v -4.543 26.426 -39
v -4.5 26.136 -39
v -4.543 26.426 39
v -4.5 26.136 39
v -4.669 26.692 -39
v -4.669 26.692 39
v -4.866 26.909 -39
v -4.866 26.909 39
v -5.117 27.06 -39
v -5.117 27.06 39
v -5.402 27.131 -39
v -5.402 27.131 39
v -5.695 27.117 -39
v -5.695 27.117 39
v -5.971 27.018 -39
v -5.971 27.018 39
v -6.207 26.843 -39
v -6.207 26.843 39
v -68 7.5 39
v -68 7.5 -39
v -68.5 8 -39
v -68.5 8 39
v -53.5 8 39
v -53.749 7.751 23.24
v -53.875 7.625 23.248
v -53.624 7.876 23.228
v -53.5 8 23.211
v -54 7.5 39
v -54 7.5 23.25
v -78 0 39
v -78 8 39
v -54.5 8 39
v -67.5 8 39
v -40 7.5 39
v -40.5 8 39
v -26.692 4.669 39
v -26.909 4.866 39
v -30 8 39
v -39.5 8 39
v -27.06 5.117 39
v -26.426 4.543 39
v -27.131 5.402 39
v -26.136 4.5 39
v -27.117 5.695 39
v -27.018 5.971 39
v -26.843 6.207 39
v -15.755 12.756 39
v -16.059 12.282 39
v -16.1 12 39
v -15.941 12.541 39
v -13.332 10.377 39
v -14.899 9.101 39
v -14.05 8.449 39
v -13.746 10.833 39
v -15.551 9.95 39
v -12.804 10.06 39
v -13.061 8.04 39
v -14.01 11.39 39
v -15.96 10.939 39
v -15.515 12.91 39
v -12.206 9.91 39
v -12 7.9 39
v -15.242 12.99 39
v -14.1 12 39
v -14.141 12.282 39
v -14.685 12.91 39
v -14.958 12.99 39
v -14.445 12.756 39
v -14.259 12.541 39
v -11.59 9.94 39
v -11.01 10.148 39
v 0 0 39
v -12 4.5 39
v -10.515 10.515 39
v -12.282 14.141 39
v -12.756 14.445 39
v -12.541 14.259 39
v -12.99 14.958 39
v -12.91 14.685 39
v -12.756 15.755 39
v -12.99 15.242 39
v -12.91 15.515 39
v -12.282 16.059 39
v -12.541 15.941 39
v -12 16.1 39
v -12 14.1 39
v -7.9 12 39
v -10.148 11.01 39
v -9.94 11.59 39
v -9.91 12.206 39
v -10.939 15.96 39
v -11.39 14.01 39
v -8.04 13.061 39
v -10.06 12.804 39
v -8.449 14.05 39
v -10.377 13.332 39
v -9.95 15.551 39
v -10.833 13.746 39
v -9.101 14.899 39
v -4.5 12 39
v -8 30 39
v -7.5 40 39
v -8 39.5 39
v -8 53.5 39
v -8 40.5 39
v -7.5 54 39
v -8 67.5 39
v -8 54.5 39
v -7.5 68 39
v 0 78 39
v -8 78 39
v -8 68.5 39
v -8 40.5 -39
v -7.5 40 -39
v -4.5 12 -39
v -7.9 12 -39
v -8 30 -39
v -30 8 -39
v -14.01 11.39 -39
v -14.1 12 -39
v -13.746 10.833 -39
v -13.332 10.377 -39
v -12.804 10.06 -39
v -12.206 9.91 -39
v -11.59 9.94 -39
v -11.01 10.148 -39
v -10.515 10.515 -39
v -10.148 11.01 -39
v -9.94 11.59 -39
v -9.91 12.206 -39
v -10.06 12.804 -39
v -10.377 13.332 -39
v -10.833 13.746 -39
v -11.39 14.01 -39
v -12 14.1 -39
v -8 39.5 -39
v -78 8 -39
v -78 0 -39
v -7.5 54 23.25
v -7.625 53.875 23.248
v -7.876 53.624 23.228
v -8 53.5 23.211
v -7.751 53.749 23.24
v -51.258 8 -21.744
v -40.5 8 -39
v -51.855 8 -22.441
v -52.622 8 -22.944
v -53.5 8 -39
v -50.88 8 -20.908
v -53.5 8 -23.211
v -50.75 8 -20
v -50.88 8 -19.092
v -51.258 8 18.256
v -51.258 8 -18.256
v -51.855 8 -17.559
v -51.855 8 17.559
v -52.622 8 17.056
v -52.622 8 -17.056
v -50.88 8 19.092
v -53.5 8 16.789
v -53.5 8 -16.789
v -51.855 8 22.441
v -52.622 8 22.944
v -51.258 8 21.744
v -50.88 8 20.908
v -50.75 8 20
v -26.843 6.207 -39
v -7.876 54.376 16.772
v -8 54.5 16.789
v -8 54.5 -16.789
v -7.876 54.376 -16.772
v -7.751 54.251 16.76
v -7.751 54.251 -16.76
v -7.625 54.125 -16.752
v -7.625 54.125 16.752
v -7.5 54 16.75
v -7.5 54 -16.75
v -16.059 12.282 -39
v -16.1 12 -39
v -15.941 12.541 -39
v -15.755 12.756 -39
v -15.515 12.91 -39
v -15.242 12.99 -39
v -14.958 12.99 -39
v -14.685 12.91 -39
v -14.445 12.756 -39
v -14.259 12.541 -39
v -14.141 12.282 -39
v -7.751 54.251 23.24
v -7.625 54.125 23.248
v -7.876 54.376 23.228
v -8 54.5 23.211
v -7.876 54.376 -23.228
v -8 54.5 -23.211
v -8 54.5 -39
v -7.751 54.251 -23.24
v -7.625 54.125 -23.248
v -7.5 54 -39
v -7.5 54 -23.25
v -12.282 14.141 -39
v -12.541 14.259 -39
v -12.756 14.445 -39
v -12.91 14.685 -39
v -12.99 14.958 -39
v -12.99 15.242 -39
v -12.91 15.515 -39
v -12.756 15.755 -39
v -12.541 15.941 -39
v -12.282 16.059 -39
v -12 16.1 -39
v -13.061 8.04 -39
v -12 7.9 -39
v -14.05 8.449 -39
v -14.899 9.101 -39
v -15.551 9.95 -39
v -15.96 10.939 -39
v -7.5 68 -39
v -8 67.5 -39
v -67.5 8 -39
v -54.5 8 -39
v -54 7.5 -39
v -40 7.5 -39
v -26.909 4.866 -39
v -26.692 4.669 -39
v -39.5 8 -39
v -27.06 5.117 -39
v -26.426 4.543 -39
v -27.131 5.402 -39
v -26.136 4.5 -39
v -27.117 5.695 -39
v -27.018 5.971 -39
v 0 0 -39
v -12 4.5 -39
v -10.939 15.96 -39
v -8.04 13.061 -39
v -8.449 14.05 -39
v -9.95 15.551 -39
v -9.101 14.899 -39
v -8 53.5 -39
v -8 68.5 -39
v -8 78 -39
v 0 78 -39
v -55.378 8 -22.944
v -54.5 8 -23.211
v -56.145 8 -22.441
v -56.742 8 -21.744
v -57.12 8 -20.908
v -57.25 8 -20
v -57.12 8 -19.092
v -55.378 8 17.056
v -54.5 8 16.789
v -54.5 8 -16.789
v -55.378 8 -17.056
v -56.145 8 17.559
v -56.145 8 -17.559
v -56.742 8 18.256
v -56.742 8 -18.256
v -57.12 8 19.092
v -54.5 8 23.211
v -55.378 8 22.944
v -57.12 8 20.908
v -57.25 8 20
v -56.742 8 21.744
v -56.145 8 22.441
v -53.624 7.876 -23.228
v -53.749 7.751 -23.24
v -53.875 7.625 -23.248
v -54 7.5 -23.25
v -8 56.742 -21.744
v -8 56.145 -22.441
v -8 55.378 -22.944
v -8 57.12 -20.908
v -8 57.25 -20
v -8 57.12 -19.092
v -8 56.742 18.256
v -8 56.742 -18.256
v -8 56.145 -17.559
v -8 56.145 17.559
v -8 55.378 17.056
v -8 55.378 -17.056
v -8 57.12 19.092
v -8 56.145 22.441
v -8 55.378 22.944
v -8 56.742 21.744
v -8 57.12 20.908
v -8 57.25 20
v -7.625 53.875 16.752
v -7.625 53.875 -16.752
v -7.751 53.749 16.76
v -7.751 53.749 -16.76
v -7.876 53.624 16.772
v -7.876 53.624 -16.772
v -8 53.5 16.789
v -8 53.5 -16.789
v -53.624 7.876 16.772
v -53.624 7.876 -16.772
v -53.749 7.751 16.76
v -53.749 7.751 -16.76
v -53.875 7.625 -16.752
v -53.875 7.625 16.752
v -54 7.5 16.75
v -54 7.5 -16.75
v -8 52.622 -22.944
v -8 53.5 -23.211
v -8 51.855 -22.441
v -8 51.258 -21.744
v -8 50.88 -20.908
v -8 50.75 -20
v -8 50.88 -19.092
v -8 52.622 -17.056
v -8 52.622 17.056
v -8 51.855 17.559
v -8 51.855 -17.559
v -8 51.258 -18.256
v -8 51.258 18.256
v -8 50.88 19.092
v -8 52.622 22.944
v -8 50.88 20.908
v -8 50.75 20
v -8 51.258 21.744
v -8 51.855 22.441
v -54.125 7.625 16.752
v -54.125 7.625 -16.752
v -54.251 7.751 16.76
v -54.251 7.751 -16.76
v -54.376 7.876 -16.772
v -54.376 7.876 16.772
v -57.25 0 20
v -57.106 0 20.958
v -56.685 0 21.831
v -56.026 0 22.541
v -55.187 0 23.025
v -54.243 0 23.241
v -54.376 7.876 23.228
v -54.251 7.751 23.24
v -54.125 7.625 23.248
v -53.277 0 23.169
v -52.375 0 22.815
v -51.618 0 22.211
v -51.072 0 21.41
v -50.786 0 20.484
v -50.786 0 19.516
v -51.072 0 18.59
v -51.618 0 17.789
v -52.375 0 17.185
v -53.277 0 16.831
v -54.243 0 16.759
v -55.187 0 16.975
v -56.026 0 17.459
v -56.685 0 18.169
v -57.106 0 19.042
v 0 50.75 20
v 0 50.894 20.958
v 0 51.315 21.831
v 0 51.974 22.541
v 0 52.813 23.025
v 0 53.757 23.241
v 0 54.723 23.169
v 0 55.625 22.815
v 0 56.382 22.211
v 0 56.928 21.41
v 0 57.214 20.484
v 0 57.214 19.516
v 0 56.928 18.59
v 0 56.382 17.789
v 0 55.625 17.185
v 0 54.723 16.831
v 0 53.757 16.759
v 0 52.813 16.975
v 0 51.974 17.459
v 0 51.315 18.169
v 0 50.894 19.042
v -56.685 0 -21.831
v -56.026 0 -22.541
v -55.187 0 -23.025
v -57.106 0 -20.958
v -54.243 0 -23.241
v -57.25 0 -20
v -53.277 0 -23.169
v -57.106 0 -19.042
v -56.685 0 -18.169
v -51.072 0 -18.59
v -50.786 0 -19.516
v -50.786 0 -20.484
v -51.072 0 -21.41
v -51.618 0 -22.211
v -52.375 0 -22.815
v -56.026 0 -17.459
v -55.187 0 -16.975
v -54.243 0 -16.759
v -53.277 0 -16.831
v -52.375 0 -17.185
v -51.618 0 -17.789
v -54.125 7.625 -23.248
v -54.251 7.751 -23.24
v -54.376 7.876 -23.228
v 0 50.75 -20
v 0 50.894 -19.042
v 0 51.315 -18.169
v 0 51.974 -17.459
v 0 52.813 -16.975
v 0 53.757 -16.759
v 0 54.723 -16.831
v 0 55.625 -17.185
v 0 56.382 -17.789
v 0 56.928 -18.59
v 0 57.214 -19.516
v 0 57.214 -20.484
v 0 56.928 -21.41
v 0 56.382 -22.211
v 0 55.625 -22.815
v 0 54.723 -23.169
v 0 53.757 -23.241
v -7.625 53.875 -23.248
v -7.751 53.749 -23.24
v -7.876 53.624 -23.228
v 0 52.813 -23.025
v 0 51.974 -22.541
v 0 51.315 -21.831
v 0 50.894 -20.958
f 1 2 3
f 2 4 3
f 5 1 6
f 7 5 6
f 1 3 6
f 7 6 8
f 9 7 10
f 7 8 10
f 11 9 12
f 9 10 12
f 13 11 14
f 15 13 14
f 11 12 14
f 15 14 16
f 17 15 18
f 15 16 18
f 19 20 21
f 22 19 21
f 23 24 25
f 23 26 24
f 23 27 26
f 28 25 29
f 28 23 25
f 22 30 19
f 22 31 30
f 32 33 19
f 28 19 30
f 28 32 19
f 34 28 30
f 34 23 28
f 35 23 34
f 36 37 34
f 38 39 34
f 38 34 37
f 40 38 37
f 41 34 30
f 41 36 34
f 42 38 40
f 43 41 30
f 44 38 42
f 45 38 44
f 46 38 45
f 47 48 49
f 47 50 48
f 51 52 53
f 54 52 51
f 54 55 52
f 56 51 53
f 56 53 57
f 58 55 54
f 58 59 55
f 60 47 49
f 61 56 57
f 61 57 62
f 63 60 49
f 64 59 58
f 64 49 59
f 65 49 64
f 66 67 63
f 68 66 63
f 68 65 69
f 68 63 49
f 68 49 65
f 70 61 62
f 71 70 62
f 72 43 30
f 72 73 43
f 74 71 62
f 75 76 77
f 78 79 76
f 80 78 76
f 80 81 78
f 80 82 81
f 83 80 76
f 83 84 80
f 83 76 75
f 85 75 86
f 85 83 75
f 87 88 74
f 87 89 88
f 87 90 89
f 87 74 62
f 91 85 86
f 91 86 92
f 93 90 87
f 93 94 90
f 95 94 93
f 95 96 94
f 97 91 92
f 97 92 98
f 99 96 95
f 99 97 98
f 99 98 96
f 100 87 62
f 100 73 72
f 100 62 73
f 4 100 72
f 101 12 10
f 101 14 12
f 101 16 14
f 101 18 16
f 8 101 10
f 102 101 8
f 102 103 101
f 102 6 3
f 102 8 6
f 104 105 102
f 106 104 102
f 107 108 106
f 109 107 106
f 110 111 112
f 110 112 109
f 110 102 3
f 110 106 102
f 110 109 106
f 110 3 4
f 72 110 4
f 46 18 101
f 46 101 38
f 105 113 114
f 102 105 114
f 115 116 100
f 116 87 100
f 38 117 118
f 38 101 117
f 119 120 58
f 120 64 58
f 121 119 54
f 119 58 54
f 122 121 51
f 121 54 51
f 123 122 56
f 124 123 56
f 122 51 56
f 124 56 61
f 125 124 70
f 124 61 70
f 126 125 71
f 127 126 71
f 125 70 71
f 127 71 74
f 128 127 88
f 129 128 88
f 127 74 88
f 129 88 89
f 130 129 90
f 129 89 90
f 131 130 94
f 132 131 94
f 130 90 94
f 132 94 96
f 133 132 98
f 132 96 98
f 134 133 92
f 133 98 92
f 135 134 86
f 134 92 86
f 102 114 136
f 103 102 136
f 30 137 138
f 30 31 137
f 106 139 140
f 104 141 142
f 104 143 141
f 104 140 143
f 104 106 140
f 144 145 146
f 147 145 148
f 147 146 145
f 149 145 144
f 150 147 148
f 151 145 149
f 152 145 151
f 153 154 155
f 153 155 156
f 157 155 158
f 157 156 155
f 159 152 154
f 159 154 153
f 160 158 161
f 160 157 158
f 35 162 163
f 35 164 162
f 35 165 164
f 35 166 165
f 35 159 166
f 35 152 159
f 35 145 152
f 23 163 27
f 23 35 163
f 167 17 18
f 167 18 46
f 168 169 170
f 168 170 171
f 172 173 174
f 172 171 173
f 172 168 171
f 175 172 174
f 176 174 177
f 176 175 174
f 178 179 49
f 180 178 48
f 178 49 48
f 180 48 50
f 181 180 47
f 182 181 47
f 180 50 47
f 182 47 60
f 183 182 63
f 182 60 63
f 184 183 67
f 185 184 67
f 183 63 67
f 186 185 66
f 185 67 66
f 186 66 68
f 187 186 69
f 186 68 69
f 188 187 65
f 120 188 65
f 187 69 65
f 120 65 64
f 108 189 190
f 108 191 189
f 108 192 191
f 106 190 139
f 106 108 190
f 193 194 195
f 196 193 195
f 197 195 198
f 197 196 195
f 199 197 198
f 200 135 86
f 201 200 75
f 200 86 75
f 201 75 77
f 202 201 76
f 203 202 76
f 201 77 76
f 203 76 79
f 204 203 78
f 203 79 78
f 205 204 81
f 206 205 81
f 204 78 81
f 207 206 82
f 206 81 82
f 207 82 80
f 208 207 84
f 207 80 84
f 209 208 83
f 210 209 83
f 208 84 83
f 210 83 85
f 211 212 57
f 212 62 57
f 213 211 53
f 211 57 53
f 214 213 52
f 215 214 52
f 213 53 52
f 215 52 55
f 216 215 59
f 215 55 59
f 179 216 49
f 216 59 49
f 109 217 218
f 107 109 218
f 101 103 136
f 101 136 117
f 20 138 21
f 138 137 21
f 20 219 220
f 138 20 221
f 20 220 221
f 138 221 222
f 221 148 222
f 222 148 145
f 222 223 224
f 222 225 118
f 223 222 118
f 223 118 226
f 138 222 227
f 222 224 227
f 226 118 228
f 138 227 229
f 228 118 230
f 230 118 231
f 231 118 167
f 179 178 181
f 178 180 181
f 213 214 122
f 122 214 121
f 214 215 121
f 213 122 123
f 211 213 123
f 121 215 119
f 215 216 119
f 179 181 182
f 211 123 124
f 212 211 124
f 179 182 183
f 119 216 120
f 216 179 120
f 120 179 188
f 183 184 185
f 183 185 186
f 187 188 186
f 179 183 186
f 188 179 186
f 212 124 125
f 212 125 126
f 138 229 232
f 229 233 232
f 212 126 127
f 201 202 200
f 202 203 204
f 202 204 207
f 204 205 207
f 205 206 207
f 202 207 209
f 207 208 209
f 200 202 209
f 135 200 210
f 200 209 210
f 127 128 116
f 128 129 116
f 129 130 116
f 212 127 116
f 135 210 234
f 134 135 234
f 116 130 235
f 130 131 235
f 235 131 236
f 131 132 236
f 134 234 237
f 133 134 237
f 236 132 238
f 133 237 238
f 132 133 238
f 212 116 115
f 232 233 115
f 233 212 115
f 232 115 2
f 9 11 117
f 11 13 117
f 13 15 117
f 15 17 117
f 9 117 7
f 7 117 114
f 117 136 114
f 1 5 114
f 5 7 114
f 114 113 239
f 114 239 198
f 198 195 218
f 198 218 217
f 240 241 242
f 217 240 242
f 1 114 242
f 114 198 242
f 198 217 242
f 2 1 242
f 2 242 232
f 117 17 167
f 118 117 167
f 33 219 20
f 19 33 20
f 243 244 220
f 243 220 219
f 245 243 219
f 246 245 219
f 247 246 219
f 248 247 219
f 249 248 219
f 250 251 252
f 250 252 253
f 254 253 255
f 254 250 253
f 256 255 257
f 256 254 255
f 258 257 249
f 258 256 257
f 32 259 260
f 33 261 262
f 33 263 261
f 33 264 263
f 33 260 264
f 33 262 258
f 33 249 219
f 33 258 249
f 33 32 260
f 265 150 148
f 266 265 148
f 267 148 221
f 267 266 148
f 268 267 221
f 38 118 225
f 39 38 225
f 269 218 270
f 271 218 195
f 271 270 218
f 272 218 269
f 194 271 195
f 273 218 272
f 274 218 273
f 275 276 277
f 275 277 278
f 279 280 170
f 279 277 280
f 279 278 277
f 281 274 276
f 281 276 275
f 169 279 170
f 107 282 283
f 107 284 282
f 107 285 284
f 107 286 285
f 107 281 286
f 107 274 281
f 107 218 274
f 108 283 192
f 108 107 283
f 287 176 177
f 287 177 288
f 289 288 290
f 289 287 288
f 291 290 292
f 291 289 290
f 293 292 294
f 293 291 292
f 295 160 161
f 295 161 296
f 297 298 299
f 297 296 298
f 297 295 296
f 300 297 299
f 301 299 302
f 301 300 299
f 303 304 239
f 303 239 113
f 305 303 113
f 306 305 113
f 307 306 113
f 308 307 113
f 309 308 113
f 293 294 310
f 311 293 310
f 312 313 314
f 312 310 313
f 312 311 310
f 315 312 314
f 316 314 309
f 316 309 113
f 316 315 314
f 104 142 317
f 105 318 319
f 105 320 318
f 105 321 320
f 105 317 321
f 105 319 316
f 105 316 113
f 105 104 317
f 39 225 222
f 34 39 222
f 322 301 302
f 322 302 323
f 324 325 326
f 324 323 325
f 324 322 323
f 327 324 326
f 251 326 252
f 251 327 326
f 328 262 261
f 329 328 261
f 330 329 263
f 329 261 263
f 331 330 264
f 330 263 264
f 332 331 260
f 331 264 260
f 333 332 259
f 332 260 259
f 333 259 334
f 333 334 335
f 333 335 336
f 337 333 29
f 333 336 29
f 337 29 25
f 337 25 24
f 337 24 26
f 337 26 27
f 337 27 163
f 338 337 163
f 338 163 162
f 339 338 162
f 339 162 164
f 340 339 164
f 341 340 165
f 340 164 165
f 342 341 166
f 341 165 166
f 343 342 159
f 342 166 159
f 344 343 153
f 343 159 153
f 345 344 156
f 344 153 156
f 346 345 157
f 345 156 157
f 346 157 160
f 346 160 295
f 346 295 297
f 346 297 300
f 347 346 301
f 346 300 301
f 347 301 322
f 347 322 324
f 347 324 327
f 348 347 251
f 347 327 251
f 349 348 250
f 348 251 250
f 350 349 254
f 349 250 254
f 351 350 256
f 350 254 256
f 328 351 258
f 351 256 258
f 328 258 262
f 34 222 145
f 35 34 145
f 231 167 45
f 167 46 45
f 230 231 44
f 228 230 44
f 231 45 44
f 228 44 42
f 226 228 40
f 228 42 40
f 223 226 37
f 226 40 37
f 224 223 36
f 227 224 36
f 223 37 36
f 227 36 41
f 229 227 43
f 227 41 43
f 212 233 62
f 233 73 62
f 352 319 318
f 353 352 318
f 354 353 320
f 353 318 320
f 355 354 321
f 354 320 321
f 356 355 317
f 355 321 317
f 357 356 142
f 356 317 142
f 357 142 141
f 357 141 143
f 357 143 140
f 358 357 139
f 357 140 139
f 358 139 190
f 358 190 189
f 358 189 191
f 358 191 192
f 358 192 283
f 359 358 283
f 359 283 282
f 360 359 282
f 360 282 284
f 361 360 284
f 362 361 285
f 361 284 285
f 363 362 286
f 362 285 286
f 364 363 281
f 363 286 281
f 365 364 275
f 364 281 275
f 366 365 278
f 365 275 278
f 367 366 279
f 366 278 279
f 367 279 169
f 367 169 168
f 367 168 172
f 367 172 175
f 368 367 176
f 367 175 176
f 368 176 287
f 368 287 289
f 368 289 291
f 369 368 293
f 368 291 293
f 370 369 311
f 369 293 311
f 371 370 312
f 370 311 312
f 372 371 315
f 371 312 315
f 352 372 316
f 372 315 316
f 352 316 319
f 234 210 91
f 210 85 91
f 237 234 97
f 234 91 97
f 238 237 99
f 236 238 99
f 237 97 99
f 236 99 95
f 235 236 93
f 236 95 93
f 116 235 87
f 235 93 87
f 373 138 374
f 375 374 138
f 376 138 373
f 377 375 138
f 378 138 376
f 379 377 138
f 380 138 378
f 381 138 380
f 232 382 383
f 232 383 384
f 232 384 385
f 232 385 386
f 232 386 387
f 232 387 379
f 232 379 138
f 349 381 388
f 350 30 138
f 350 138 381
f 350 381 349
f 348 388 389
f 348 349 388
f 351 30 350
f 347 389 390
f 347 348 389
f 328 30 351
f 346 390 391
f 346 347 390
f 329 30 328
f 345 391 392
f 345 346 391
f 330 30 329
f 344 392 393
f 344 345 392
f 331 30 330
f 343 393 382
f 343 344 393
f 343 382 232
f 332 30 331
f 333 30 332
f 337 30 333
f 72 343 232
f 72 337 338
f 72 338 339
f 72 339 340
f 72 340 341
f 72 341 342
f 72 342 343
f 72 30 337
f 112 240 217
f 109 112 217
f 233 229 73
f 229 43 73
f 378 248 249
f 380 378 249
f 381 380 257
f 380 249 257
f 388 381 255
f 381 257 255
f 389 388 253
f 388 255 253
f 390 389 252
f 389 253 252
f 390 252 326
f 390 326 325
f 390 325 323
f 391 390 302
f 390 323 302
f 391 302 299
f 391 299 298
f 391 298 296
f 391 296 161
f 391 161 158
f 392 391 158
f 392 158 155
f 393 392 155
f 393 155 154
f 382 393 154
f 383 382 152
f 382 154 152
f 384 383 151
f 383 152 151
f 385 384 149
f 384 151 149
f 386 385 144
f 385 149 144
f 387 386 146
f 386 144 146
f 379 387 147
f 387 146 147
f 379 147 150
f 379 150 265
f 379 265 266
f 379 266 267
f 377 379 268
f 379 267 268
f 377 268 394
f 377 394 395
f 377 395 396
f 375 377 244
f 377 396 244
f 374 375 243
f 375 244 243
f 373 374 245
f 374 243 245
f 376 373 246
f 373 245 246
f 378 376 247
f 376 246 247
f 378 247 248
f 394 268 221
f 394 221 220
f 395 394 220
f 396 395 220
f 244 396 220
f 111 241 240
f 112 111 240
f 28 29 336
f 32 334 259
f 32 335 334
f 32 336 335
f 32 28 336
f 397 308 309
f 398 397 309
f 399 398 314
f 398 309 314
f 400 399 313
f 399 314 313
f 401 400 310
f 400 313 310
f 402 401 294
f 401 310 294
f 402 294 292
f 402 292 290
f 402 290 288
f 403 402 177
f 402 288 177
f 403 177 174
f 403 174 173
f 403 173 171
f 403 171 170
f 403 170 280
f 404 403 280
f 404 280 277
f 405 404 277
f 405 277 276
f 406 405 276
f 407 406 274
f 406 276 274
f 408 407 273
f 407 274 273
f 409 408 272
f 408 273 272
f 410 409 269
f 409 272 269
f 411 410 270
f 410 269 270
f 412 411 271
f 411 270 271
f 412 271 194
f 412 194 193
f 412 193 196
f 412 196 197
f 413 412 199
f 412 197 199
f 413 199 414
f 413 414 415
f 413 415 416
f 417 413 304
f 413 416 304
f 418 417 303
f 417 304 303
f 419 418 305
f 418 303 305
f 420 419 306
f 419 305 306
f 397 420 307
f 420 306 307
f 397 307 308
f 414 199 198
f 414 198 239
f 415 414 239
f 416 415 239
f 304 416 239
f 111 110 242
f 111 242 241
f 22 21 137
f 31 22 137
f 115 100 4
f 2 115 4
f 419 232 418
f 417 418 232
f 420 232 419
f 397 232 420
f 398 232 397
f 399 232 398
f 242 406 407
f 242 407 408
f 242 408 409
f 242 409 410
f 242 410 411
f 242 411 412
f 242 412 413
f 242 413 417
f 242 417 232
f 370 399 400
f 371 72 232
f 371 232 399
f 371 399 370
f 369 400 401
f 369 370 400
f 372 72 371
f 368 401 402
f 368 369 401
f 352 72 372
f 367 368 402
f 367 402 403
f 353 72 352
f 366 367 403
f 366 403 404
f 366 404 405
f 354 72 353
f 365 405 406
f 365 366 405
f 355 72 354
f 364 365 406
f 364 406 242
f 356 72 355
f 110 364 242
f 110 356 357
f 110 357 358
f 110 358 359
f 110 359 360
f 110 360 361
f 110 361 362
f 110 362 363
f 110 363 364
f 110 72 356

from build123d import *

# Parameters (mm, degrees)
EXTRUDE_1_DEPTH     = 39
SKETCH_2_R          = 3.25
CUT_EXTRUDE_1_DEPTH = 9
SKETCH_3_R          = 3.25
CUT_EXTRUDE_2_DEPTH = 9


with BuildPart() as part:
    # Эскиз1 → Бобышка-Вытянуть1 (new body, symmetric)
    with BuildSketch(Plane.XY):
        Polygon((-78, 0), (0, 0), (0, 78), (-8, 78), (-8, 68.5), (-7.5, 68), (-8, 67.5), (-8, 54.5), (-7.5, 54), (-8, 53.5), (-8, 40.5), (-7.5, 40), (-8, 39.5), (-8, 30), (-30, 8), (-39.5, 8), (-40, 7.5), (-40.5, 8), (-53.5, 8), (-54, 7.5), (-54.5, 8), (-67.5, 8), (-68, 7.5), (-68.5, 8), (-78, 8), align=None)
        with BuildLine():
            Line((-4.5, 12), (-4.5, 26.136038969))
            ThreePointArc((-4.5, 26.136038969), (-5.117316568, 27.059918502), (-6.207106781, 26.843145751))
            Line((-6.207106781, 26.843145751), (-26.843145751, 6.207106781))
            ThreePointArc((-26.843145751, 6.207106781), (-27.059918502, 5.117316568), (-26.136038969, 4.5))
            Line((-26.136038969, 4.5), (-12, 4.5))
            Line((-12, 4.5), (-12, 7.9))
            ThreePointArc((-12, 7.9), (-14.899137803, 9.100862197), (-16.1, 12))
            ThreePointArc((-16.1, 12), (-15.1, 13), (-14.1, 12))
            ThreePointArc((-14.1, 12), (-10.51507576, 10.51507576), (-12, 14.1))
            ThreePointArc((-12, 14.1), (-13, 15.1), (-12, 16.1))
            ThreePointArc((-12, 16.1), (-9.100862197, 14.899137803), (-7.9, 12))
            Line((-7.9, 12), (-4.5, 12))
        make_face(mode=Mode.SUBTRACT)
    extrude(amount=EXTRUDE_1_DEPTH, both=True)

    # Эскиз2 → Вырез-Вытянуть1 (cut, through all)
    with BuildSketch(Plane.ZY.offset(8)):
        with Locations(Location((-20, 54, 0), (0, 0, 270))):  # turned: the seam where the file's is
            Circle(SKETCH_2_R)
        with Locations(Location((20, 54, 0), (0, 0, 270))):  # turned: the seam where the file's is
            Circle(SKETCH_2_R)
    extrude(amount=-CUT_EXTRUDE_1_DEPTH, mode=Mode.SUBTRACT)

    # Эскиз3 → Вырез-Вытянуть2 (cut, through all)
    with BuildSketch(Plane(origin=(0, 8, 0), x_dir=(1, 0, 0), z_dir=(0, 1, 0))):
        with Locations(Location((-54, -20, 0), (0, 0, 180))):  # turned: the seam where the file's is
            Circle(SKETCH_3_R)
        with Locations(Location((-54, 20, 0), (0, 0, 180))):  # turned: the seam where the file's is
            Circle(SKETCH_3_R)
    extrude(amount=-CUT_EXTRUDE_2_DEPTH, mode=Mode.SUBTRACT)


solid = part.part
